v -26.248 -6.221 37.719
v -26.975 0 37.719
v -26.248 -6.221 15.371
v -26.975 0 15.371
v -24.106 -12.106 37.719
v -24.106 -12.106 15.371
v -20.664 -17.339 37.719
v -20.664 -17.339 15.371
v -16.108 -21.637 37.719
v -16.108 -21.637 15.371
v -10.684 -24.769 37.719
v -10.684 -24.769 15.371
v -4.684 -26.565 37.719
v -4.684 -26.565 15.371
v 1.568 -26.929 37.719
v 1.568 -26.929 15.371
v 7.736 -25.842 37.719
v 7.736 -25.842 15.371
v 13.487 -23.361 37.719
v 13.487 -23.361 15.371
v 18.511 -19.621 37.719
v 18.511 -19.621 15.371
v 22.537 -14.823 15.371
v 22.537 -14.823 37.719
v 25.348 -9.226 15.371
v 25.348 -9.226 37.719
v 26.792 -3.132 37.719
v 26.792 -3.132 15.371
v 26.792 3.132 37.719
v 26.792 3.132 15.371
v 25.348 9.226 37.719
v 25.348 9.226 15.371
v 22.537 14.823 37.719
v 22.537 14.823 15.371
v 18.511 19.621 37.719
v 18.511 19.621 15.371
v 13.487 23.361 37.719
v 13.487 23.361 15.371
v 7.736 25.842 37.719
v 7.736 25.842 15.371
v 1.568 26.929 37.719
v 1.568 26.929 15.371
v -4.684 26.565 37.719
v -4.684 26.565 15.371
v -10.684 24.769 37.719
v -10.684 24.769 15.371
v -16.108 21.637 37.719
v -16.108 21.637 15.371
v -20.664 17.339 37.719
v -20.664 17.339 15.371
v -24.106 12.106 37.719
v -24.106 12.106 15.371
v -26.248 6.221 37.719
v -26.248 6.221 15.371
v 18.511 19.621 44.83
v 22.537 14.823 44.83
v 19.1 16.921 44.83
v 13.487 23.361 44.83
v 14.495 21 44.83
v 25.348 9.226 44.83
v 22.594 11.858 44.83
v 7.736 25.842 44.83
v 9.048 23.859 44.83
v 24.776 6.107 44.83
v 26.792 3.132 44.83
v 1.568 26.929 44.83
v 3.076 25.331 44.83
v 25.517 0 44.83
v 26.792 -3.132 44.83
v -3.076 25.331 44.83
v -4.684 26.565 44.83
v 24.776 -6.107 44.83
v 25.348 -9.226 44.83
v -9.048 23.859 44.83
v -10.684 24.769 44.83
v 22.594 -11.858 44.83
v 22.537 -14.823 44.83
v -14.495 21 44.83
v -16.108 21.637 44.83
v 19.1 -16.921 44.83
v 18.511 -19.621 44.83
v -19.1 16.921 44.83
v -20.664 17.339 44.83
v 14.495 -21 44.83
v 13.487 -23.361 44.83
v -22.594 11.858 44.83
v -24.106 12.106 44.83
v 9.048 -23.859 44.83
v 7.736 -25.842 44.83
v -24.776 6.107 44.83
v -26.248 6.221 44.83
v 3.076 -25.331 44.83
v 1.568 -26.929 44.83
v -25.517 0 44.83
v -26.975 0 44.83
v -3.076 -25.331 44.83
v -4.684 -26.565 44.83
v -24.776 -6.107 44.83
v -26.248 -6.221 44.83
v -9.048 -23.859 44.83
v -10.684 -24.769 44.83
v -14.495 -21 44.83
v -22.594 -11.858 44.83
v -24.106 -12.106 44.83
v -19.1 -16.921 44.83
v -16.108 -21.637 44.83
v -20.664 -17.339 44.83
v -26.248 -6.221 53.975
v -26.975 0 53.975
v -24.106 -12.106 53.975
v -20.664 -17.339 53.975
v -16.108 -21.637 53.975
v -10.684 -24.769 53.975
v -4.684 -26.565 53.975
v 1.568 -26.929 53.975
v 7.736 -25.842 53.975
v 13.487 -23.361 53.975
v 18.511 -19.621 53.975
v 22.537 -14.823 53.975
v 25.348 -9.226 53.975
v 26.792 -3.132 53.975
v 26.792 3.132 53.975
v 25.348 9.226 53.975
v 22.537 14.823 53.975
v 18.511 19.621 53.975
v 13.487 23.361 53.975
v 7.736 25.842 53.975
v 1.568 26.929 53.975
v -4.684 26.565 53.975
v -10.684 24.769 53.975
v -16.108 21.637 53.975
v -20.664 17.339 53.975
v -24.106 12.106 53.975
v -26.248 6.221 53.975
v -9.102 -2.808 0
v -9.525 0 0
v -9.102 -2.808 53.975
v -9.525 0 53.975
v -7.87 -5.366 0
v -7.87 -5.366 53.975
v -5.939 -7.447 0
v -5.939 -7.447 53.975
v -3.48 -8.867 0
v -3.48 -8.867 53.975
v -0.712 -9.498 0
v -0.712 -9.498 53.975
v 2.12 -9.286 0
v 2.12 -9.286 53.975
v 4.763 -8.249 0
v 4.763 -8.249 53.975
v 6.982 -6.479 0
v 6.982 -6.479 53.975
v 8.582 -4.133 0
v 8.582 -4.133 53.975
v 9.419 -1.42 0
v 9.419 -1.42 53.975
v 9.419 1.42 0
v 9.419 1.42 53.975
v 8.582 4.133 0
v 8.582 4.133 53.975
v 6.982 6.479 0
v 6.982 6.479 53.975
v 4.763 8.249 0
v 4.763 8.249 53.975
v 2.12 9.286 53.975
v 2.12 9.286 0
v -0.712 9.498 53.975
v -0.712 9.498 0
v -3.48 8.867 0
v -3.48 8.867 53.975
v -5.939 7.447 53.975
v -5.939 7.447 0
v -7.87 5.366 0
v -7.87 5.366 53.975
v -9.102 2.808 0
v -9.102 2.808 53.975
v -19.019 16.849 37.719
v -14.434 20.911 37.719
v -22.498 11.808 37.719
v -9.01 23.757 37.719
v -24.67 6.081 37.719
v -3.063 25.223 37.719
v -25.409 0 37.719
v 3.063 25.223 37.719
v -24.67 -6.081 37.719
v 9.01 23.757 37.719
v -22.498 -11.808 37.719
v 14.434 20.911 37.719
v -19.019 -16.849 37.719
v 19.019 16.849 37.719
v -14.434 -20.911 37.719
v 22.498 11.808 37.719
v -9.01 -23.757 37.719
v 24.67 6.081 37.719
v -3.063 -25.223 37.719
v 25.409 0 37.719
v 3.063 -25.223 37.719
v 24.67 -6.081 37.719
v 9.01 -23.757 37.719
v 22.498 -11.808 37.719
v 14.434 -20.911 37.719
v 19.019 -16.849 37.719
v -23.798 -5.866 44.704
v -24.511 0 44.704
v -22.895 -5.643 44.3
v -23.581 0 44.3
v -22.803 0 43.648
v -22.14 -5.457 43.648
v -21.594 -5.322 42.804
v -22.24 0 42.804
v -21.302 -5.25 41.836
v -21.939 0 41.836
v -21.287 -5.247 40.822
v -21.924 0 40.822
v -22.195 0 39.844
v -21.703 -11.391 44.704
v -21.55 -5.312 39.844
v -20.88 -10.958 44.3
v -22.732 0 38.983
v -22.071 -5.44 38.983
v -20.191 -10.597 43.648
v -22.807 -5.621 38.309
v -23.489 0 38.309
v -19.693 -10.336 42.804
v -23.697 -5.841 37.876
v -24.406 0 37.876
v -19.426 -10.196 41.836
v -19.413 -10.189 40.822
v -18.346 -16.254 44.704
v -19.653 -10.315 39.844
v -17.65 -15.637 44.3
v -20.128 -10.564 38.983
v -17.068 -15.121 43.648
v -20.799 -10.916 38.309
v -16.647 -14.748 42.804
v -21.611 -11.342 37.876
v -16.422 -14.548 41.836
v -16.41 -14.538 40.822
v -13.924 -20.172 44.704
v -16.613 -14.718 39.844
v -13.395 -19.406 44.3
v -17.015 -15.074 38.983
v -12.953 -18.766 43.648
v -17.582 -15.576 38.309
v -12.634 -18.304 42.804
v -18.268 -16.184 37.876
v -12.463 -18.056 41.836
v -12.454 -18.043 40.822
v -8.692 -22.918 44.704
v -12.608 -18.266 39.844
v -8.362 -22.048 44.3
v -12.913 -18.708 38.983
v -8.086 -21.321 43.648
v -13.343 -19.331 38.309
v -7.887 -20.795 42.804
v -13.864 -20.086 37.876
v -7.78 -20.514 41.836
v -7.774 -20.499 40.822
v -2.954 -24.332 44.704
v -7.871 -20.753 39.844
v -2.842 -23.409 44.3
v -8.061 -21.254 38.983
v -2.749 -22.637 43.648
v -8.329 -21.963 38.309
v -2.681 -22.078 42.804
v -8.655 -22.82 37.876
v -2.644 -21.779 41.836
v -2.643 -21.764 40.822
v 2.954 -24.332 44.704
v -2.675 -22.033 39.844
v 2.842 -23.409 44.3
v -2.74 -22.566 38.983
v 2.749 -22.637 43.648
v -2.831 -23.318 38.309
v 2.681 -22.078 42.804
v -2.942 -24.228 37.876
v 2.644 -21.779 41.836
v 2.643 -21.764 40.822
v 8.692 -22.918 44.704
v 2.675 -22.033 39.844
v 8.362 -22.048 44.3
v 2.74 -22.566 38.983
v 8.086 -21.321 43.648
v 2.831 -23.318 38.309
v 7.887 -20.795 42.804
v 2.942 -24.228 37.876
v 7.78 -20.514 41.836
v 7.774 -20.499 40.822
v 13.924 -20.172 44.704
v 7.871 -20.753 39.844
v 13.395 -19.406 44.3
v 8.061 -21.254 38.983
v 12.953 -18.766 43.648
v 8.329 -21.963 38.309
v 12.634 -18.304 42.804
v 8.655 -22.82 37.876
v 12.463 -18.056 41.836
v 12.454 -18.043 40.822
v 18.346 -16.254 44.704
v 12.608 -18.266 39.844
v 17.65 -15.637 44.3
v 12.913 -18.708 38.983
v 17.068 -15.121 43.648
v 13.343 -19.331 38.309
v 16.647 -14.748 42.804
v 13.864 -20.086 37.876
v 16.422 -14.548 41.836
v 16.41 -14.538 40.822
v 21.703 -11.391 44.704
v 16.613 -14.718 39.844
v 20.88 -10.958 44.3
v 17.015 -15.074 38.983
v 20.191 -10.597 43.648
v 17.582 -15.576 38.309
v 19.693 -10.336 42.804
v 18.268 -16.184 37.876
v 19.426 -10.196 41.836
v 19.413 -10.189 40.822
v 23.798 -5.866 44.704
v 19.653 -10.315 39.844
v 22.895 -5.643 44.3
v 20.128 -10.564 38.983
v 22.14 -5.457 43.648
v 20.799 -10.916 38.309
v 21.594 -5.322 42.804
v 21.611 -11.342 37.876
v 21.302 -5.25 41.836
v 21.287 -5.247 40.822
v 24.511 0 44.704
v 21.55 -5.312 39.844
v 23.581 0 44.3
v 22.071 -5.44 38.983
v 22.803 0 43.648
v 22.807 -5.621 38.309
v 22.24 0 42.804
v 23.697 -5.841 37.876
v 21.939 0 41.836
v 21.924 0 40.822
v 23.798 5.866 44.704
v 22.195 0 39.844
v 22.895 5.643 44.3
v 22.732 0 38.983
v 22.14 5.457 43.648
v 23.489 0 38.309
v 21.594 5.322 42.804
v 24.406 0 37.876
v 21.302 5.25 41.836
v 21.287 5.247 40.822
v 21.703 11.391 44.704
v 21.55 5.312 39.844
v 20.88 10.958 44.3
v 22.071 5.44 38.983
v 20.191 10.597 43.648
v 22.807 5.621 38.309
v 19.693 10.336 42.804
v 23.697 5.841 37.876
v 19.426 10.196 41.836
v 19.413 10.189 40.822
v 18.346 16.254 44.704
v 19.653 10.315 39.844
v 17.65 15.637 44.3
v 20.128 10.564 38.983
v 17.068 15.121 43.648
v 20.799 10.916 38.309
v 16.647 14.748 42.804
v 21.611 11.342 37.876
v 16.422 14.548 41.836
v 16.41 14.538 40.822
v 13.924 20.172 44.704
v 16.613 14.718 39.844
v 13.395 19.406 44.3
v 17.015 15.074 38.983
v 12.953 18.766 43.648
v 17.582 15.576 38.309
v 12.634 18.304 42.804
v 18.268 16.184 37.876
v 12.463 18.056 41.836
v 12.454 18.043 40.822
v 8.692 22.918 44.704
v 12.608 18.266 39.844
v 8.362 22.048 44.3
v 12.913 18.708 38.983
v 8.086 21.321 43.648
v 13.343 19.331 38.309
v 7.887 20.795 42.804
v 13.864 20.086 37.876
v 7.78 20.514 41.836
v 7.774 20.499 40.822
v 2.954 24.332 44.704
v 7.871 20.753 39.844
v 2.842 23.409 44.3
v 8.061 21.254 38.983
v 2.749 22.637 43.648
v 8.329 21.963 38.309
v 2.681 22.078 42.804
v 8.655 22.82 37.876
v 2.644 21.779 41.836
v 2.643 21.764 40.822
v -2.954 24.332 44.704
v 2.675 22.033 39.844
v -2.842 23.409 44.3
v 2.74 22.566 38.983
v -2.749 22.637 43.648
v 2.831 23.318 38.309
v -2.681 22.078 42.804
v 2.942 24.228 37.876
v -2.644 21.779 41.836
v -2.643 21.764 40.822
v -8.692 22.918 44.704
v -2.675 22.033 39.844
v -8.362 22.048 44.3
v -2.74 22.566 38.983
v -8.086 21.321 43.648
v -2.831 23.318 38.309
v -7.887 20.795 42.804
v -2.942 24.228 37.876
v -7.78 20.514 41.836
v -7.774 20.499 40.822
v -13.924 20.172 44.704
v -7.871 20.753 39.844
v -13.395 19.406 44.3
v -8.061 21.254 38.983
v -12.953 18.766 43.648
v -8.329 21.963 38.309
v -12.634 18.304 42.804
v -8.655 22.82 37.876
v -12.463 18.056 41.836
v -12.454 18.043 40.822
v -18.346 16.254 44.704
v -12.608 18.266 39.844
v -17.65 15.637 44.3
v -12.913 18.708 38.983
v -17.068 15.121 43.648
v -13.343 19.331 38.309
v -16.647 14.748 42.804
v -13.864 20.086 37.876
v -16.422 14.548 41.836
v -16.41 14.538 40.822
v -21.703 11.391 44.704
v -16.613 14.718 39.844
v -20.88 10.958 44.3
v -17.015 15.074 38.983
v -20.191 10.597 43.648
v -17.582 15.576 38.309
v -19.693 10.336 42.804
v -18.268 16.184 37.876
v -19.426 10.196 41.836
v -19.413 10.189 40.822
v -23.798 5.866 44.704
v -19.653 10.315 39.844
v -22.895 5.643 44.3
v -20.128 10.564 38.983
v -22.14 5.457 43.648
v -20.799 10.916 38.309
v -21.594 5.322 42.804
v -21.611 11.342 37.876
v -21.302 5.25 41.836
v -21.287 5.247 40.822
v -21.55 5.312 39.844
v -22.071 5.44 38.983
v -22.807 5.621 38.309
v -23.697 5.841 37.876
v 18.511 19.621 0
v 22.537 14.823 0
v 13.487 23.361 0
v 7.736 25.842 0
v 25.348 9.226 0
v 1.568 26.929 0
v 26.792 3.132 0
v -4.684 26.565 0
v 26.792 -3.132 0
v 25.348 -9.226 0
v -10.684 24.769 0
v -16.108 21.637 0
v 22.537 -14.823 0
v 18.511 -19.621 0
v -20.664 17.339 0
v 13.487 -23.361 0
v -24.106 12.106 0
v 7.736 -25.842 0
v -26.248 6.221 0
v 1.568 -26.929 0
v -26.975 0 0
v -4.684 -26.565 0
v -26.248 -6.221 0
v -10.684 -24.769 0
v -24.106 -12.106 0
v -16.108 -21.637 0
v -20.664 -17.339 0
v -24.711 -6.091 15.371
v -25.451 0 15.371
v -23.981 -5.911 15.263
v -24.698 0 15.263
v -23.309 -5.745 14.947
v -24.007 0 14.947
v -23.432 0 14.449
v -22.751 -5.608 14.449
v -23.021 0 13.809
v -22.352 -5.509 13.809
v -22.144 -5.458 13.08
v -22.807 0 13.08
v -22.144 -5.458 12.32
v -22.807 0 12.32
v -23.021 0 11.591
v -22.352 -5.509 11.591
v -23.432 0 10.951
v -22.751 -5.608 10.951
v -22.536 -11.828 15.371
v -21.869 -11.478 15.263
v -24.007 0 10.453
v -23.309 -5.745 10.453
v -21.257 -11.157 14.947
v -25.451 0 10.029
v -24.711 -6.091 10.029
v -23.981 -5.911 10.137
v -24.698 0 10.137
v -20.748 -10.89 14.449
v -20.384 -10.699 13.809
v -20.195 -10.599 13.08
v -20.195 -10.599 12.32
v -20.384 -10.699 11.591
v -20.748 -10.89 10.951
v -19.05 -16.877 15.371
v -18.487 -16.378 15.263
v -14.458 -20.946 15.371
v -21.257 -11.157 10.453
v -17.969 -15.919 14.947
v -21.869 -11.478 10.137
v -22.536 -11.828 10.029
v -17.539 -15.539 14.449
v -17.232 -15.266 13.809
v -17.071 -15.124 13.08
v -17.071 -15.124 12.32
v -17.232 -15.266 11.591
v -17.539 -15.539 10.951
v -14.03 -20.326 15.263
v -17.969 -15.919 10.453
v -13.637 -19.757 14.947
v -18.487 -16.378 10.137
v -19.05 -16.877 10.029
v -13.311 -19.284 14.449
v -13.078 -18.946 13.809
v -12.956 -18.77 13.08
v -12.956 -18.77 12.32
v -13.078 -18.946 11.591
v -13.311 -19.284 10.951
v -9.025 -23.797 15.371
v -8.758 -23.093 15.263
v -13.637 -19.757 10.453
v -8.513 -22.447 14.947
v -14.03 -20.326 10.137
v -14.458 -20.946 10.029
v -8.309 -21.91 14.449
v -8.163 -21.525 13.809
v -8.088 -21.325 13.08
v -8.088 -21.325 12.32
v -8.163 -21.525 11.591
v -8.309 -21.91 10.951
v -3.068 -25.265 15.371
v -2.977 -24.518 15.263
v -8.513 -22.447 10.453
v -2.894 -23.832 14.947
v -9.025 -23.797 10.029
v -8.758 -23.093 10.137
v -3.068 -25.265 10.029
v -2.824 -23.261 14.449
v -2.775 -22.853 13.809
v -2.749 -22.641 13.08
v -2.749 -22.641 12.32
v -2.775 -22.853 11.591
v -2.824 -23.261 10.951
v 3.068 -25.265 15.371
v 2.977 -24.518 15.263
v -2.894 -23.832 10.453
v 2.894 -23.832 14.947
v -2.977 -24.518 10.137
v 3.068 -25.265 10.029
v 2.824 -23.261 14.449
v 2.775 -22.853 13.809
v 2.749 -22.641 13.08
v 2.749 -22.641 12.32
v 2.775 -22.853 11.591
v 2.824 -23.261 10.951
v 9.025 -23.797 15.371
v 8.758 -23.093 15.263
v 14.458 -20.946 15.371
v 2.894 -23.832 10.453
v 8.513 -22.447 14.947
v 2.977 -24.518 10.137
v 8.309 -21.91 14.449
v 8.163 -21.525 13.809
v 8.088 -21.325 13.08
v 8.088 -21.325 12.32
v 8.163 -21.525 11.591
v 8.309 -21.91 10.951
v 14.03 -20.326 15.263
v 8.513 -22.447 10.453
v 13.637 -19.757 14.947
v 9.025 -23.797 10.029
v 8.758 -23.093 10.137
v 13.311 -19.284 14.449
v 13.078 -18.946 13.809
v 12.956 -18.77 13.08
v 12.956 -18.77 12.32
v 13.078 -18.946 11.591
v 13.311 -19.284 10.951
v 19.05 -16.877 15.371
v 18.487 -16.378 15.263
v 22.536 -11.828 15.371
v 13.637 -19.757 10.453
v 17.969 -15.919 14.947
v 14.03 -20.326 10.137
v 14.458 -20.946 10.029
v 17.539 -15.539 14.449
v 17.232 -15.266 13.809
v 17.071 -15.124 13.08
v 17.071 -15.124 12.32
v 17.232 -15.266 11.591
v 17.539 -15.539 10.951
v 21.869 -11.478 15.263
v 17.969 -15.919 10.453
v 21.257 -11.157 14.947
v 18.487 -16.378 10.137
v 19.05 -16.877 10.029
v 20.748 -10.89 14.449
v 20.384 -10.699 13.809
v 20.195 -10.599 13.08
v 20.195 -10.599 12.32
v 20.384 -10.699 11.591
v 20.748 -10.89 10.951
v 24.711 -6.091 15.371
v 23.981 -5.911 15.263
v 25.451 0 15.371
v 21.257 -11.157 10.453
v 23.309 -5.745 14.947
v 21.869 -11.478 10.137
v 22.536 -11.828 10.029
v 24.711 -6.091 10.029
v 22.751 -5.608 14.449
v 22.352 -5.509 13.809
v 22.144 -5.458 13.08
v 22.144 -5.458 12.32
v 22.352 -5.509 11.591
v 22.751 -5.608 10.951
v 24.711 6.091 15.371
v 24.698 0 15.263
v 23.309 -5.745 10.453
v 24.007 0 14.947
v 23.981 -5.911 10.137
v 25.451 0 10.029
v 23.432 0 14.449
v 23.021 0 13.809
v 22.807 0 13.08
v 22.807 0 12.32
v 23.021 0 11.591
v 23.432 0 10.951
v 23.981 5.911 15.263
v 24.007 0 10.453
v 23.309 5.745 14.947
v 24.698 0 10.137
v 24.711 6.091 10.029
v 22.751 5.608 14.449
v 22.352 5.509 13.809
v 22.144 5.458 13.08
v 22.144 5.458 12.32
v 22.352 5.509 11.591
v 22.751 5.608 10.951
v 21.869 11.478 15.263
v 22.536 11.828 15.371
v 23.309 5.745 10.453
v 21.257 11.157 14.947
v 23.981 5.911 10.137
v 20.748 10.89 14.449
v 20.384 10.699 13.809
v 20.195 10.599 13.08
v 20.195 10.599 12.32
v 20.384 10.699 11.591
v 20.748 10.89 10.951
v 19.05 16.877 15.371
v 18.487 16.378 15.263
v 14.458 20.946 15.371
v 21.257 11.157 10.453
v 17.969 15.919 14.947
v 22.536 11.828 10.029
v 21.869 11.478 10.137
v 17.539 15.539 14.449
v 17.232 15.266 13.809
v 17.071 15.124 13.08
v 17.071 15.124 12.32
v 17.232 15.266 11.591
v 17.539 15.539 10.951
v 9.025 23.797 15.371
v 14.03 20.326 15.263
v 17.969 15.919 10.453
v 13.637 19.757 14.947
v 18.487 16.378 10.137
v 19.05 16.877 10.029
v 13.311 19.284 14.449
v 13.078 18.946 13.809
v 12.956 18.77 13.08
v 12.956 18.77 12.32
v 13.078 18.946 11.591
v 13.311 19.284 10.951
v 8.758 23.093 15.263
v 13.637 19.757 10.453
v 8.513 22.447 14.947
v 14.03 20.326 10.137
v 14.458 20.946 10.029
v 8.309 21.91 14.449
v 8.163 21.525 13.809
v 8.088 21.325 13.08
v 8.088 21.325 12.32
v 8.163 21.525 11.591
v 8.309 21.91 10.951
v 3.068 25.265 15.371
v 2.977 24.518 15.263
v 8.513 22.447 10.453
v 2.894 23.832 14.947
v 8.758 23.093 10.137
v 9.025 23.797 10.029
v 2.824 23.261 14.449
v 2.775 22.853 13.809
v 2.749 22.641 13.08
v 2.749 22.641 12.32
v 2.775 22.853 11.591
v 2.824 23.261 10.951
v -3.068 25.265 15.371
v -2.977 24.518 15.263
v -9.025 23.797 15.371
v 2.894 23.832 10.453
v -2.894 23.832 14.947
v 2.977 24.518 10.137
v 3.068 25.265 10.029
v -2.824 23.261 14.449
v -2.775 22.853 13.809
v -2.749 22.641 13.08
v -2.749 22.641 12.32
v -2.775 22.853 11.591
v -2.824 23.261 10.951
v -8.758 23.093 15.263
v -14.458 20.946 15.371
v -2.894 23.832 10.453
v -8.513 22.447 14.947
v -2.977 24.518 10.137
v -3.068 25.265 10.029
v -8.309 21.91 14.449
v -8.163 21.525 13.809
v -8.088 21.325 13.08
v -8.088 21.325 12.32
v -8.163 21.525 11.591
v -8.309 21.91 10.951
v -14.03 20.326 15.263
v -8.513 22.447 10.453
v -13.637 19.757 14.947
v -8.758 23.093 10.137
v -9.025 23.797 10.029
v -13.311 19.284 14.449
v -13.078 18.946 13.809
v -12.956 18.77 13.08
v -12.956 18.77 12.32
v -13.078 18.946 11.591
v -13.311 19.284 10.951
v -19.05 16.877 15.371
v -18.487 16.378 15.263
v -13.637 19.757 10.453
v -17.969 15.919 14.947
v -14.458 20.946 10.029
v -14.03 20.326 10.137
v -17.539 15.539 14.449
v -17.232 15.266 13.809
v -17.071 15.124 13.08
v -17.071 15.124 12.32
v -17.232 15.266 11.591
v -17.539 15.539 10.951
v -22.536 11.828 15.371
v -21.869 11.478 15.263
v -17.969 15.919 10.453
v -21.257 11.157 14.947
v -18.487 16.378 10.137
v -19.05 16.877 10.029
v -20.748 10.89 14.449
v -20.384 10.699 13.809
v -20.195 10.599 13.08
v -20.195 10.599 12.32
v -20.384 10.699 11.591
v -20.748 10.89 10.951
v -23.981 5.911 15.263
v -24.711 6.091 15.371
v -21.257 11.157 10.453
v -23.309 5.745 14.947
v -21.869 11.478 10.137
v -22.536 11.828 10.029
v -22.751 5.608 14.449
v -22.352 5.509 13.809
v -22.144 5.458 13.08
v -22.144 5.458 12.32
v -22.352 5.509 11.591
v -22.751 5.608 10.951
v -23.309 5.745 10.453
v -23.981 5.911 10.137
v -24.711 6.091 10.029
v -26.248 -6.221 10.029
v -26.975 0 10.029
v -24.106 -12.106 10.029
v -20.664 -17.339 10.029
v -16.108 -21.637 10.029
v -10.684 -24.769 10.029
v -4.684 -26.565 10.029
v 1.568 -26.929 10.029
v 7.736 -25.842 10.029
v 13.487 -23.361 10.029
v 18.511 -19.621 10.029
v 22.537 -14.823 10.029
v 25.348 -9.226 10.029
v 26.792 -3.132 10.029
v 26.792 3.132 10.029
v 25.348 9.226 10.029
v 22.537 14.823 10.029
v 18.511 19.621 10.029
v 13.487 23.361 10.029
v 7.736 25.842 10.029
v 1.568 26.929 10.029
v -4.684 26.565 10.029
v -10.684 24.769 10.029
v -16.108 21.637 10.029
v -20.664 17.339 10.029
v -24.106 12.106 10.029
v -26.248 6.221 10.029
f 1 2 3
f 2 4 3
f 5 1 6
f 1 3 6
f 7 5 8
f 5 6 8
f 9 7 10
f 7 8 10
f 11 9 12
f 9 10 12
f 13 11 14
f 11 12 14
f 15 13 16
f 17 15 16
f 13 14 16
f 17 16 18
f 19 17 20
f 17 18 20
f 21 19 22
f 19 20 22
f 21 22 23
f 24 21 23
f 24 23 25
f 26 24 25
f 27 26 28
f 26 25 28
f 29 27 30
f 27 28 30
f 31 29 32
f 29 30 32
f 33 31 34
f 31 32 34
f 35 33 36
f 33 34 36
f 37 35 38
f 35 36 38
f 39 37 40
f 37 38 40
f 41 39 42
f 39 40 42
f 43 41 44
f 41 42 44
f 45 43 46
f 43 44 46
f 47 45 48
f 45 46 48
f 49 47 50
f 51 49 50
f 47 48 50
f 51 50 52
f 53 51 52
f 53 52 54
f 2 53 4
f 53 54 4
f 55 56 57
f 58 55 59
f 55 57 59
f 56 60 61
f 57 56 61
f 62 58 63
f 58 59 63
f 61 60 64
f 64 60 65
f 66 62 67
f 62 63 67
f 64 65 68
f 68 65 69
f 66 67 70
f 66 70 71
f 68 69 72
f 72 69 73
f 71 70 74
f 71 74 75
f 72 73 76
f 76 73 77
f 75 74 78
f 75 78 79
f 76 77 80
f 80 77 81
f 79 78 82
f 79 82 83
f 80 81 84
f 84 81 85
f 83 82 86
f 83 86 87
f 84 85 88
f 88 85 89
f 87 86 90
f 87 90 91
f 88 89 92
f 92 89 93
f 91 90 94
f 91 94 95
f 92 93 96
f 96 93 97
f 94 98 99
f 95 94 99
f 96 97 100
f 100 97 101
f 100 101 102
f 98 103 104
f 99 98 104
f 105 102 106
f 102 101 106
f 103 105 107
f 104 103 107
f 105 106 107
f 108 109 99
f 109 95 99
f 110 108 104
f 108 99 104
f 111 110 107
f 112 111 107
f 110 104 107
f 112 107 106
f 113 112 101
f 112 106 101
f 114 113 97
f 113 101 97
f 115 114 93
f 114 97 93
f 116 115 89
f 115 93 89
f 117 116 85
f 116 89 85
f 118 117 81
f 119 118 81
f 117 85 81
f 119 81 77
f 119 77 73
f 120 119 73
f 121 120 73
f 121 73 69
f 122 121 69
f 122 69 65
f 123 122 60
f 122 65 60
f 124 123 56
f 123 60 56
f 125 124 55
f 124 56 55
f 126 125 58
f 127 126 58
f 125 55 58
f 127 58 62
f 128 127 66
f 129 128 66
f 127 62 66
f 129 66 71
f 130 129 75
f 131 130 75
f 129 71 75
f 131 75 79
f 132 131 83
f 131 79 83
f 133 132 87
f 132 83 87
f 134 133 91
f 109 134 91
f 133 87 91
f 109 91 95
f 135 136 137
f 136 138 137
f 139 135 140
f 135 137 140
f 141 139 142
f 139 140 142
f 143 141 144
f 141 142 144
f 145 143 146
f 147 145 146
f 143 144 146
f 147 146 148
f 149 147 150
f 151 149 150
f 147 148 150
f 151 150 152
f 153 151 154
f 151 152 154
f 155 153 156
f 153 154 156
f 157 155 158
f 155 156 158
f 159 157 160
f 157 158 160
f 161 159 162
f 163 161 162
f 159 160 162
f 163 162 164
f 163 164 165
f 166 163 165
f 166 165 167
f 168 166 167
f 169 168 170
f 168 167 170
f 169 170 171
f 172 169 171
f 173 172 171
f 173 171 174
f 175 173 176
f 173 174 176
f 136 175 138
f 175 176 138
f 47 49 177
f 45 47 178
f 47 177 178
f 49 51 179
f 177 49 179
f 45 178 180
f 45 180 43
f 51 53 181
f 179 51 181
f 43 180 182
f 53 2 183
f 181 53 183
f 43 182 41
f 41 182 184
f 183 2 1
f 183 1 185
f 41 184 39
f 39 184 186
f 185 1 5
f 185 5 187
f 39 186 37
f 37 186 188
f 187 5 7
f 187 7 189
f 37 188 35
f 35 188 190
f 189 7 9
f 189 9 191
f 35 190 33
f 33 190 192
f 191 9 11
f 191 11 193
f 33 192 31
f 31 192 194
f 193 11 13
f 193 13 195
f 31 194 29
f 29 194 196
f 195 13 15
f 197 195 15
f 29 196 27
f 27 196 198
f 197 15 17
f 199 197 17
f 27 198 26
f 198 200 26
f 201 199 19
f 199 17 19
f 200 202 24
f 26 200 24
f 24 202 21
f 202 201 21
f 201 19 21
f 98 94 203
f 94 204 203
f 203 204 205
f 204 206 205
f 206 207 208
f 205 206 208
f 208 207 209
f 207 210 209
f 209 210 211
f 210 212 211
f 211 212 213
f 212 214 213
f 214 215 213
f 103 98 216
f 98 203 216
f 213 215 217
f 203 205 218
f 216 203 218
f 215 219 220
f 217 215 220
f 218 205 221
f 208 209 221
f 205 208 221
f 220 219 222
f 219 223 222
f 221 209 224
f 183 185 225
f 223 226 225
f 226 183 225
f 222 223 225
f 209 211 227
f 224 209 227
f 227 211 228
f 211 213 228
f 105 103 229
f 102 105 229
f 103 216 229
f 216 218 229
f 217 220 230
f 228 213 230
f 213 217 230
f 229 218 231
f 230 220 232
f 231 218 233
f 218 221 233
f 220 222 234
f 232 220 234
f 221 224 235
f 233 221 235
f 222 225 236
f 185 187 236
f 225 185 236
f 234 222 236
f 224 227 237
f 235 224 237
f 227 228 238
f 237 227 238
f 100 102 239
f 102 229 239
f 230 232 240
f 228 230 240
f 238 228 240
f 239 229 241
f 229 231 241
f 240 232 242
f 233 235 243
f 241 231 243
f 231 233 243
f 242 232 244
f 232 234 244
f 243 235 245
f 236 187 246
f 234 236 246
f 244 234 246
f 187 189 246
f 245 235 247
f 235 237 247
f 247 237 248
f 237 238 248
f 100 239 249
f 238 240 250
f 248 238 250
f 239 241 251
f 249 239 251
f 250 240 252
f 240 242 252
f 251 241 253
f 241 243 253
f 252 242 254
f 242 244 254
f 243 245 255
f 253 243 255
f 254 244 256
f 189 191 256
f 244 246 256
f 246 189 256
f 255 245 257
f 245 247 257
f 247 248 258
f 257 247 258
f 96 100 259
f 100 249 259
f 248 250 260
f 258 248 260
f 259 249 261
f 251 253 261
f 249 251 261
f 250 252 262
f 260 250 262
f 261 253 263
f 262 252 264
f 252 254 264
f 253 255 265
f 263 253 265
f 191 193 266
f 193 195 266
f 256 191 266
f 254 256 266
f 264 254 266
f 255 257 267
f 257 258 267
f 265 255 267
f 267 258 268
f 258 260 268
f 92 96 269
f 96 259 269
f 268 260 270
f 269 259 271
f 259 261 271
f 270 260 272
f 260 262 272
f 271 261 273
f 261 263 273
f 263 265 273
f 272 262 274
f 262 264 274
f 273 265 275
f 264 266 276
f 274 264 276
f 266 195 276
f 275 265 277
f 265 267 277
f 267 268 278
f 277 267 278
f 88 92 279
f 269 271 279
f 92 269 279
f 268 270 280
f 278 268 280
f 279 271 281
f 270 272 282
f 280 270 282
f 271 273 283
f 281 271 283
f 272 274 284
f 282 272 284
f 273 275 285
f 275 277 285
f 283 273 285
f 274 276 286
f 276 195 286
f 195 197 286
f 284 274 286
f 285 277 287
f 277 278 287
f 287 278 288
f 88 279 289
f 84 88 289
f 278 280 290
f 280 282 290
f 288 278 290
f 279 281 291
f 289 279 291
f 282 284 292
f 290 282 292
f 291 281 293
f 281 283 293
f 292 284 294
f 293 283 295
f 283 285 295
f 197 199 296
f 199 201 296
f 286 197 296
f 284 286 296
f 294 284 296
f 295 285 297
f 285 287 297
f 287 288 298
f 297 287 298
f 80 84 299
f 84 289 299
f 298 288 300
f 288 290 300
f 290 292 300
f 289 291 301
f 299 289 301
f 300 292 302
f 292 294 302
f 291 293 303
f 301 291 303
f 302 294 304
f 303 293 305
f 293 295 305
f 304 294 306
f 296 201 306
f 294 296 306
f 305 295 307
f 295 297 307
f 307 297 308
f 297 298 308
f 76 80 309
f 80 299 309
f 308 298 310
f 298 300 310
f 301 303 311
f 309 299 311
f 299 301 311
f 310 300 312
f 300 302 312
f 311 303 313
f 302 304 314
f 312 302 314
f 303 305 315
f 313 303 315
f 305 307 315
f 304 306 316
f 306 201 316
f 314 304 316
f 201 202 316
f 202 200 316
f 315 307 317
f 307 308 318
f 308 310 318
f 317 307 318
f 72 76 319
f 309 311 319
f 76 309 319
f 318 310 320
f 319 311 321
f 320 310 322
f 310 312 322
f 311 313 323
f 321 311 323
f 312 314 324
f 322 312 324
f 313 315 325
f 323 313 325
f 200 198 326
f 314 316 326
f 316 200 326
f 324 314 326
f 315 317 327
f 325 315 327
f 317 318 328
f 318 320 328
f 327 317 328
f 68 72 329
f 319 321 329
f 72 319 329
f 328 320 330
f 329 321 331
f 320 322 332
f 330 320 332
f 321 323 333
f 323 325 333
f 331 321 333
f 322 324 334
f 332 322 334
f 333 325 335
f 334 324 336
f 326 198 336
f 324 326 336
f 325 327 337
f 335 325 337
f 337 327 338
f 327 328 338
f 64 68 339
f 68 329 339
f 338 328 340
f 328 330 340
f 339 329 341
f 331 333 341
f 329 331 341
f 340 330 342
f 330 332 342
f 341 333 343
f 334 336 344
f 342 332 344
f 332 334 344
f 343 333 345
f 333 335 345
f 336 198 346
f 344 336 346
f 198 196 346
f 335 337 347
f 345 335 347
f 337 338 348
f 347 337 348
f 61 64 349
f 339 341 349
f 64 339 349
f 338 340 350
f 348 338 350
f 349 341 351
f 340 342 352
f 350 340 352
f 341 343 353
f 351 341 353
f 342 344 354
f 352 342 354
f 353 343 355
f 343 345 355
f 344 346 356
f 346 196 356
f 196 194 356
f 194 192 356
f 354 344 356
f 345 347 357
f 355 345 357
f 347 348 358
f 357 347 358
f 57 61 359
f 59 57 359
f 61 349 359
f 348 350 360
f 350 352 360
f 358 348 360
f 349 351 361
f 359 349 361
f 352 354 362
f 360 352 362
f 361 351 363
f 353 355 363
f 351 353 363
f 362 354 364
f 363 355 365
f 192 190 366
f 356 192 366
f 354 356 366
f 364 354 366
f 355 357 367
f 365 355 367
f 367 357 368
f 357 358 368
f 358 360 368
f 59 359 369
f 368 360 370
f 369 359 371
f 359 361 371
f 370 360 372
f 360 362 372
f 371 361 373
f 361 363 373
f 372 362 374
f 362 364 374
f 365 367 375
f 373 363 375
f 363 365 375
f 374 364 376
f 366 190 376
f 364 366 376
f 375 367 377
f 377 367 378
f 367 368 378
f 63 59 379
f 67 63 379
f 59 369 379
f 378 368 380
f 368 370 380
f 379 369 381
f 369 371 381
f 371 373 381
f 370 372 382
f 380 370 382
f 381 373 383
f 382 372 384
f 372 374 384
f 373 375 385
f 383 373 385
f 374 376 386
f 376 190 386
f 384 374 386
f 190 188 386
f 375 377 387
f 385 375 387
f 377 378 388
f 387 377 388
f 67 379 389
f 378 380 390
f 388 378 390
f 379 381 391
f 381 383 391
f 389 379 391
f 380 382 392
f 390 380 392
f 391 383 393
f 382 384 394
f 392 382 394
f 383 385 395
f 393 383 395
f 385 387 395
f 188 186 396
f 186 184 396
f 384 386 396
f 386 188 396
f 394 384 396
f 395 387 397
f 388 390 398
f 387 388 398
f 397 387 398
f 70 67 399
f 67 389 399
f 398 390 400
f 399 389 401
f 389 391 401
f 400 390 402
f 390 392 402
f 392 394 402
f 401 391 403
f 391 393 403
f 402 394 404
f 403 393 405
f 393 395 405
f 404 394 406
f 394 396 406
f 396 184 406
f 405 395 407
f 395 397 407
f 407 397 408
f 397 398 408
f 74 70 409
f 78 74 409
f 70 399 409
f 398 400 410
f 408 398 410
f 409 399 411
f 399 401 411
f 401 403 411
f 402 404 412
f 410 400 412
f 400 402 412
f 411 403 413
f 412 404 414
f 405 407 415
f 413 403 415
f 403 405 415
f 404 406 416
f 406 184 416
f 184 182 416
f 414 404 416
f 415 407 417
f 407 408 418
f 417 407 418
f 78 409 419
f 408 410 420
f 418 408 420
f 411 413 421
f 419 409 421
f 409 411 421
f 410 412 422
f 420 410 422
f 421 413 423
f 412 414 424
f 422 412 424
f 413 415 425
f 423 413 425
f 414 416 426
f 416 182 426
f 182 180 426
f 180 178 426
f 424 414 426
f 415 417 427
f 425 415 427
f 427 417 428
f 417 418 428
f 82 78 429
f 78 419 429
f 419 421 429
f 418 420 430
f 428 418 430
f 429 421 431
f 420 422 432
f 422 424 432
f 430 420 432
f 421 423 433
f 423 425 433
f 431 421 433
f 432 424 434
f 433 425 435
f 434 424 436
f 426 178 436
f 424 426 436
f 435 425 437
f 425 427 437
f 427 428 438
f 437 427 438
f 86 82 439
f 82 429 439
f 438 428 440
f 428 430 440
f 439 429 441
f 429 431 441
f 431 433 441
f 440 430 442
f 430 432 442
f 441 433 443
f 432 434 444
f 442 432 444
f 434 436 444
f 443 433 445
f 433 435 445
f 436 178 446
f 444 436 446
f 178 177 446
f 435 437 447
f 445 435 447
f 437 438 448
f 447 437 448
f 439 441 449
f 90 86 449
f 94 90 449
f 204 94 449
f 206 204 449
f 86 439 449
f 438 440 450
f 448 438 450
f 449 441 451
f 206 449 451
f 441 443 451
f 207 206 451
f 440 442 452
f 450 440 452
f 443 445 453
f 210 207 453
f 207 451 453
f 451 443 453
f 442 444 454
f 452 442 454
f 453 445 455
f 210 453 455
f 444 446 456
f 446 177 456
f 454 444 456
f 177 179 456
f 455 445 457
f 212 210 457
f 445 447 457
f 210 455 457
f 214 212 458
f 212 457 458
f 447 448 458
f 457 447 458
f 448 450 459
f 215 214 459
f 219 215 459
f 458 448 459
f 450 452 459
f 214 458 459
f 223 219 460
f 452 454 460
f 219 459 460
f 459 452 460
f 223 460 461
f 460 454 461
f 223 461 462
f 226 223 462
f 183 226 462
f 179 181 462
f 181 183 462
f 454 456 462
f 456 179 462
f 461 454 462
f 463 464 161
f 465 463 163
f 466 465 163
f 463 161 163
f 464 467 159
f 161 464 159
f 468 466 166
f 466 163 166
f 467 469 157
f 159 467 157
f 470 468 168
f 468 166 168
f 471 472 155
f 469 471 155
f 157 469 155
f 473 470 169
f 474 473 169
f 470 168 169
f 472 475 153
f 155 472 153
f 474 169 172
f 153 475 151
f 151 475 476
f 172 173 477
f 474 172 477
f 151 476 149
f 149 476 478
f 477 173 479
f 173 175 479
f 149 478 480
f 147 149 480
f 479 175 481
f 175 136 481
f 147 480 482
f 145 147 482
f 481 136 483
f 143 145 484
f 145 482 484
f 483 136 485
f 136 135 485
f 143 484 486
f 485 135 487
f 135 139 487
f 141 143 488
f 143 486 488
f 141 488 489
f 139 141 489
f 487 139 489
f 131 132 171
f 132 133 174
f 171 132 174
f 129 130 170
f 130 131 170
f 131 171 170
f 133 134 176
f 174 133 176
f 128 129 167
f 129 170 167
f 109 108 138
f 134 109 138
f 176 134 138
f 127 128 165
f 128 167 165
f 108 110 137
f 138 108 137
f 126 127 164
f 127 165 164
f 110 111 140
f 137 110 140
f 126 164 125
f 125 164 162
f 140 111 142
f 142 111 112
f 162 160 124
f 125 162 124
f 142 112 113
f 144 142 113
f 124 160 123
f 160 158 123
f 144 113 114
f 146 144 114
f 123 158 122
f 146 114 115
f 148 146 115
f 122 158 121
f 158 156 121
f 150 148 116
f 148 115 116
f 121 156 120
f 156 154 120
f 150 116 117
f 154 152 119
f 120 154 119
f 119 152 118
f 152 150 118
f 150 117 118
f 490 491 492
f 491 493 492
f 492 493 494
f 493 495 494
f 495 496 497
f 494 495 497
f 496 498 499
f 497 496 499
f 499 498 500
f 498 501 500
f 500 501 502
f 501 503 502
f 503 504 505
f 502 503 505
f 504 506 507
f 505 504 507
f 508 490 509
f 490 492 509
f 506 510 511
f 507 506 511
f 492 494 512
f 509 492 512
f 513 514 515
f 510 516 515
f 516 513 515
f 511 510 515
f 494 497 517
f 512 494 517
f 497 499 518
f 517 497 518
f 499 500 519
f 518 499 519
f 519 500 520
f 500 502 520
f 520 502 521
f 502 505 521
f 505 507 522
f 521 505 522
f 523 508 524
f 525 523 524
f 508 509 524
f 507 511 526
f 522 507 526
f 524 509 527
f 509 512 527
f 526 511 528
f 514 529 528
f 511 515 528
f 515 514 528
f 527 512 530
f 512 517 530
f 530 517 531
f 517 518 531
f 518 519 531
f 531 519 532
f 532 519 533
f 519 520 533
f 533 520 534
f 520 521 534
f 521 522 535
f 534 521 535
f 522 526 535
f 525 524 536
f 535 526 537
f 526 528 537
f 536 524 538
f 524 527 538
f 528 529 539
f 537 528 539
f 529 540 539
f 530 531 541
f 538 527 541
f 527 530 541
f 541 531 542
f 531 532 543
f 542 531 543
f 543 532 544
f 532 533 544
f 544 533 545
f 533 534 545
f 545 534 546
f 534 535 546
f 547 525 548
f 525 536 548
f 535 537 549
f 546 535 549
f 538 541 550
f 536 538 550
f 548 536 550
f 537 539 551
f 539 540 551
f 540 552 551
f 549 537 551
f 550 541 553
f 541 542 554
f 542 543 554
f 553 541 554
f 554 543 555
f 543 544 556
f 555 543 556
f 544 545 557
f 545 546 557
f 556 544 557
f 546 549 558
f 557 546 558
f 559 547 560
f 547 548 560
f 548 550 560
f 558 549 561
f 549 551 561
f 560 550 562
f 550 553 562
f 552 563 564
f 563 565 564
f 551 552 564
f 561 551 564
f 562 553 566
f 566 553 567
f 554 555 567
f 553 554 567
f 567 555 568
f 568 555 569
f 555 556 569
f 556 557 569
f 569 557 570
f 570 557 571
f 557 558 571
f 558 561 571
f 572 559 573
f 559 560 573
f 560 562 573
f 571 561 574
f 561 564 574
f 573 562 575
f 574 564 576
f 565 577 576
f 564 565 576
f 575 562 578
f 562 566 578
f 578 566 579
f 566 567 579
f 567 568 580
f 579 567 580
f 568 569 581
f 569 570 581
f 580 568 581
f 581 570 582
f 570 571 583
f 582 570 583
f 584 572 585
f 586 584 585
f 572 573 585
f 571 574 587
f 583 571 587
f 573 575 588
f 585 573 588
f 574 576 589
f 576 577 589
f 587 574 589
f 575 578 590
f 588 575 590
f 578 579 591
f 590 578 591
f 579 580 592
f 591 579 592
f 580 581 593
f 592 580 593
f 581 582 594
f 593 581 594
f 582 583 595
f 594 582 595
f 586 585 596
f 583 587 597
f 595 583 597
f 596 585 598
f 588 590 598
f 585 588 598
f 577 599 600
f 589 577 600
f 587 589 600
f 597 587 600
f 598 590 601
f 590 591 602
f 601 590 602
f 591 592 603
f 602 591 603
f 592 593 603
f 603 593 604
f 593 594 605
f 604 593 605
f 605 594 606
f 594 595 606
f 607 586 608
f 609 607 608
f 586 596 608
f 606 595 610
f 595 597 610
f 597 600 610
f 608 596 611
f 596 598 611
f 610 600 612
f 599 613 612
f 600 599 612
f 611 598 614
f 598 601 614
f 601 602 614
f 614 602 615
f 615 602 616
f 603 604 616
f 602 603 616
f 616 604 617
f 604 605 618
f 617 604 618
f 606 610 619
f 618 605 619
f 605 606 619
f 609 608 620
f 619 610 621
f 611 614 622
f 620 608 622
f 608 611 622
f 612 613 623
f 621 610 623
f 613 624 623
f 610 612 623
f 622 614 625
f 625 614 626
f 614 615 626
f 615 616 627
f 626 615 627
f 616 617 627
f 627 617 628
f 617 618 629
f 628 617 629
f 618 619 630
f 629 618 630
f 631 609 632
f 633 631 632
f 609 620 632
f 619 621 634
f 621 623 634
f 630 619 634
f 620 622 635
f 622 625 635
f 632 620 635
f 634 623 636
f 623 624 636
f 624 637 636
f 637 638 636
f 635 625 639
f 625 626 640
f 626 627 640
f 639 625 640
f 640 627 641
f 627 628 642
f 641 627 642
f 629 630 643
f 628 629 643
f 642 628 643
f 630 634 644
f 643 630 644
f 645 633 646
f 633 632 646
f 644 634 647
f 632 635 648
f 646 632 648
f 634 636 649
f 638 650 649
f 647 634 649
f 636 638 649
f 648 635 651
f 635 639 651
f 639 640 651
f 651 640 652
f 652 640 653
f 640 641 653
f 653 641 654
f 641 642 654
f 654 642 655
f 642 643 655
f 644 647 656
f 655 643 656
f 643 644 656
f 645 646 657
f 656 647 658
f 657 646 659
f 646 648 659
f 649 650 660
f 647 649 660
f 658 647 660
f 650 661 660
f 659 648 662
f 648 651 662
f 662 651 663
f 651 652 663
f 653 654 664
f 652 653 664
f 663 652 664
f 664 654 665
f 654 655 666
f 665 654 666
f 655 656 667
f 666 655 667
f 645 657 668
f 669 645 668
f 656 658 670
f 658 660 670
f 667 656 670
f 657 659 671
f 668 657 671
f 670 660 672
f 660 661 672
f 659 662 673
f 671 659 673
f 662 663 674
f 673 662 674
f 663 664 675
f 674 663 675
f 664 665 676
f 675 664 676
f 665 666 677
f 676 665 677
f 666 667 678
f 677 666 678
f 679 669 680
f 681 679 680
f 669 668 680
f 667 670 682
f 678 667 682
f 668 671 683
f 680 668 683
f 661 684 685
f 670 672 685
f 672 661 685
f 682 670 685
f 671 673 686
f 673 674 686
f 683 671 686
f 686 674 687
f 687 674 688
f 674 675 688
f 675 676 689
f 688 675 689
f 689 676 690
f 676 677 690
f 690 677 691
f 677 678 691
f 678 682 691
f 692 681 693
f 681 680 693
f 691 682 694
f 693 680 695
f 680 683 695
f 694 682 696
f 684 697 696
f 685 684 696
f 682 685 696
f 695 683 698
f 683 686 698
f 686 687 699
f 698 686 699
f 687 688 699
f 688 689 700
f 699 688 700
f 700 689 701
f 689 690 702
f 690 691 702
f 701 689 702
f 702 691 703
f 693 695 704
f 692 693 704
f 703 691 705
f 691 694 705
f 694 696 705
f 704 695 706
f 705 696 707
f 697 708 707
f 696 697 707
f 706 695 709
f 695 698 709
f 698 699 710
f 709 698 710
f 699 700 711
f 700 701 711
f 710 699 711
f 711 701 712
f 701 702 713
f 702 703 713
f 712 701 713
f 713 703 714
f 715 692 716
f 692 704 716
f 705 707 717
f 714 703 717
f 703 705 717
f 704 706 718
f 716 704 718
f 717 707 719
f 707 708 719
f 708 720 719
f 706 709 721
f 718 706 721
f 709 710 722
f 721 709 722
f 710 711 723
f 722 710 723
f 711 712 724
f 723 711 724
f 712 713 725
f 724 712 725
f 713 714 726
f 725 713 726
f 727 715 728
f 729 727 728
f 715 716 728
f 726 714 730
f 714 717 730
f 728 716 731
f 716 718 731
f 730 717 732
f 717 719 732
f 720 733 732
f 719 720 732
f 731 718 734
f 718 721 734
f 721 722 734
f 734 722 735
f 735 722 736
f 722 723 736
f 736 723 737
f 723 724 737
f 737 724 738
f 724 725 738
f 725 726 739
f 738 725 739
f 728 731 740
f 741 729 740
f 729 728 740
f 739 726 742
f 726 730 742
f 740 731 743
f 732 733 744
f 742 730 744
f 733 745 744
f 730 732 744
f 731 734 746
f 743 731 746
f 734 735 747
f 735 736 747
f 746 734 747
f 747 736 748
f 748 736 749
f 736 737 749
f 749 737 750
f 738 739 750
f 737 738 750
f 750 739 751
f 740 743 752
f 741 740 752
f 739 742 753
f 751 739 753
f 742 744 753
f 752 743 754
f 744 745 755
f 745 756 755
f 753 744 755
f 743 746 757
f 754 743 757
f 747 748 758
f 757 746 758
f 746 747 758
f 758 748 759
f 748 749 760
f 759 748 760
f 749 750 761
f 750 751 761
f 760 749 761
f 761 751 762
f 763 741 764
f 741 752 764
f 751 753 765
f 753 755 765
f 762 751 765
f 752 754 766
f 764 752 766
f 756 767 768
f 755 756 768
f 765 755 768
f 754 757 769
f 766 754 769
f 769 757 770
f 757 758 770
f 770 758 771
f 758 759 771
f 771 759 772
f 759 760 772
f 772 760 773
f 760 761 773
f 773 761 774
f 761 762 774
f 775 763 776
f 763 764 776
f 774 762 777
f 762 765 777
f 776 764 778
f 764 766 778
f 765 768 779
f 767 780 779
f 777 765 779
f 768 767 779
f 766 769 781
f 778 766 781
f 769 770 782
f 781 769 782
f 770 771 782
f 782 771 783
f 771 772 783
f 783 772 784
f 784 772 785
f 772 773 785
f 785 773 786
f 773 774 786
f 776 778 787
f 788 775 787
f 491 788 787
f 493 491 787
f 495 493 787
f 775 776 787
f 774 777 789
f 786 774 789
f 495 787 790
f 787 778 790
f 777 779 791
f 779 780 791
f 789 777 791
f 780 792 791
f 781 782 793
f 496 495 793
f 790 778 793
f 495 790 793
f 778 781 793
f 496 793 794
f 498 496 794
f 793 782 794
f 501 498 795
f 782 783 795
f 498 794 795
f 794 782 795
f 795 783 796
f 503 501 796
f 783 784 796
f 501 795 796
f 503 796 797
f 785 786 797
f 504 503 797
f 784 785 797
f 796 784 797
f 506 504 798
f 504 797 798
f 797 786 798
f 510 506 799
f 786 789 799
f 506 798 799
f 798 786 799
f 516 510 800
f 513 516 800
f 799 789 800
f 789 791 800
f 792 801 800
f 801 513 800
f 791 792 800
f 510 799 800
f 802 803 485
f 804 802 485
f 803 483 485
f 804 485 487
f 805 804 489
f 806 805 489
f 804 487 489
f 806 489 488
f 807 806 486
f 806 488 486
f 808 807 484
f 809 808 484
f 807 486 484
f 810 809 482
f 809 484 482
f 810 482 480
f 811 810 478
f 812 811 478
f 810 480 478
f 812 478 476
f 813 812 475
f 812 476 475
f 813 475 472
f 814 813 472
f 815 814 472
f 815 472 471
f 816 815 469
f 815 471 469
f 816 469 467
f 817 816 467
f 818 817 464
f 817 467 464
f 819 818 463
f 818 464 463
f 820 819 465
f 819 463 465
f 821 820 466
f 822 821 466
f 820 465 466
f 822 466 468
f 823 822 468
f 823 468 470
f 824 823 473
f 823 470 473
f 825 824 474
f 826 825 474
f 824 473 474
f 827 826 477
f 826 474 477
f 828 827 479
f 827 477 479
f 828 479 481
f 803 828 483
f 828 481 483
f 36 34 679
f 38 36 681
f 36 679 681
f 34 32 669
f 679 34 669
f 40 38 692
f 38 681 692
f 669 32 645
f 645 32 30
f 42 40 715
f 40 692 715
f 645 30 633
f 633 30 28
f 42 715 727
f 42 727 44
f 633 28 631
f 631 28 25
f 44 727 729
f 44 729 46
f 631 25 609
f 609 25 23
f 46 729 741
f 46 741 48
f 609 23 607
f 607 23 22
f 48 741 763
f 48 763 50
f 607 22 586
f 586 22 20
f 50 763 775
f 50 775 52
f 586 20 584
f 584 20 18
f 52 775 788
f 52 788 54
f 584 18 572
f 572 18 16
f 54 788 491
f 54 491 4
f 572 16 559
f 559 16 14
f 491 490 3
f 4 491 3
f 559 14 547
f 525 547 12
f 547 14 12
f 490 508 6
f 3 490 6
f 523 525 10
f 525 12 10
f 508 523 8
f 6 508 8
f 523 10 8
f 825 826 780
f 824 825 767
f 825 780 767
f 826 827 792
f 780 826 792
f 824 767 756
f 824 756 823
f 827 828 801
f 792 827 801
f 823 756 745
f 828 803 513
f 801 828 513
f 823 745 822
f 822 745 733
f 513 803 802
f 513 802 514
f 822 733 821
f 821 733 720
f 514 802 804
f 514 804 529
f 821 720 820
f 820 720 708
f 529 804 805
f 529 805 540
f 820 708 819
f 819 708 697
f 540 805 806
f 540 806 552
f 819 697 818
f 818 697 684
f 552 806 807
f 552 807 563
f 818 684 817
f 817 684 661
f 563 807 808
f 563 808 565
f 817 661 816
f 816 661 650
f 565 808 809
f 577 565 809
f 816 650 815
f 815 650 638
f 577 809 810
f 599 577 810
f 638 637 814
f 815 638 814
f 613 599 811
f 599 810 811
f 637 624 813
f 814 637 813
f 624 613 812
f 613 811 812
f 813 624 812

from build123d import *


with BuildPart() as f1:
    # F0 (on Front) → F1 (revolve)
    with BuildSketch(Plane.XZ):
        with BuildLine():
            Line((-26.9748, 0), (-9.525, 0))
            Line((-9.525, 0), (-9.525, 53.975))
            Line((-9.525, 53.975), (-26.9748, 53.975))
            Line((-26.9748, 53.975), (-26.9748, 44.830383))
            Line((-26.9748, 44.830383), (-25.517052, 44.830383))
            ThreePointArc((-25.517052, 44.830383), (-21.895214, 41.329264), (-25.408524, 37.719251))
            ThreePointArc((-25.408524, 37.719251), (-25.4508, 37.719), (-25.493076, 37.719251))
            Line((-25.493076, 37.719251), (-26.9748, 37.719251))
            Line((-26.9748, 37.719251), (-26.9748, 15.37081))
            Line((-26.9748, 15.37081), (-25.4508, 15.37081))
            ThreePointArc((-25.4508, 15.37081), (-22.77999, 12.7), (-25.4508, 10.02919))
            Line((-25.4508, 10.02919), (-26.9748, 10.02919))
            Line((-26.9748, 10.02919), (-26.9748, 0))
        make_face()
        with BuildLine():
            ThreePointArc((-25.493076, 37.719251), (-25.4508, 37.719), (-25.408524, 37.719251))
            Line((-25.408524, 37.719251), (-25.493076, 37.719251))
        make_face()
    revolve(axis=Axis((0, 0, 17.05089), (0, 0, 1)))


solid = f1.part
